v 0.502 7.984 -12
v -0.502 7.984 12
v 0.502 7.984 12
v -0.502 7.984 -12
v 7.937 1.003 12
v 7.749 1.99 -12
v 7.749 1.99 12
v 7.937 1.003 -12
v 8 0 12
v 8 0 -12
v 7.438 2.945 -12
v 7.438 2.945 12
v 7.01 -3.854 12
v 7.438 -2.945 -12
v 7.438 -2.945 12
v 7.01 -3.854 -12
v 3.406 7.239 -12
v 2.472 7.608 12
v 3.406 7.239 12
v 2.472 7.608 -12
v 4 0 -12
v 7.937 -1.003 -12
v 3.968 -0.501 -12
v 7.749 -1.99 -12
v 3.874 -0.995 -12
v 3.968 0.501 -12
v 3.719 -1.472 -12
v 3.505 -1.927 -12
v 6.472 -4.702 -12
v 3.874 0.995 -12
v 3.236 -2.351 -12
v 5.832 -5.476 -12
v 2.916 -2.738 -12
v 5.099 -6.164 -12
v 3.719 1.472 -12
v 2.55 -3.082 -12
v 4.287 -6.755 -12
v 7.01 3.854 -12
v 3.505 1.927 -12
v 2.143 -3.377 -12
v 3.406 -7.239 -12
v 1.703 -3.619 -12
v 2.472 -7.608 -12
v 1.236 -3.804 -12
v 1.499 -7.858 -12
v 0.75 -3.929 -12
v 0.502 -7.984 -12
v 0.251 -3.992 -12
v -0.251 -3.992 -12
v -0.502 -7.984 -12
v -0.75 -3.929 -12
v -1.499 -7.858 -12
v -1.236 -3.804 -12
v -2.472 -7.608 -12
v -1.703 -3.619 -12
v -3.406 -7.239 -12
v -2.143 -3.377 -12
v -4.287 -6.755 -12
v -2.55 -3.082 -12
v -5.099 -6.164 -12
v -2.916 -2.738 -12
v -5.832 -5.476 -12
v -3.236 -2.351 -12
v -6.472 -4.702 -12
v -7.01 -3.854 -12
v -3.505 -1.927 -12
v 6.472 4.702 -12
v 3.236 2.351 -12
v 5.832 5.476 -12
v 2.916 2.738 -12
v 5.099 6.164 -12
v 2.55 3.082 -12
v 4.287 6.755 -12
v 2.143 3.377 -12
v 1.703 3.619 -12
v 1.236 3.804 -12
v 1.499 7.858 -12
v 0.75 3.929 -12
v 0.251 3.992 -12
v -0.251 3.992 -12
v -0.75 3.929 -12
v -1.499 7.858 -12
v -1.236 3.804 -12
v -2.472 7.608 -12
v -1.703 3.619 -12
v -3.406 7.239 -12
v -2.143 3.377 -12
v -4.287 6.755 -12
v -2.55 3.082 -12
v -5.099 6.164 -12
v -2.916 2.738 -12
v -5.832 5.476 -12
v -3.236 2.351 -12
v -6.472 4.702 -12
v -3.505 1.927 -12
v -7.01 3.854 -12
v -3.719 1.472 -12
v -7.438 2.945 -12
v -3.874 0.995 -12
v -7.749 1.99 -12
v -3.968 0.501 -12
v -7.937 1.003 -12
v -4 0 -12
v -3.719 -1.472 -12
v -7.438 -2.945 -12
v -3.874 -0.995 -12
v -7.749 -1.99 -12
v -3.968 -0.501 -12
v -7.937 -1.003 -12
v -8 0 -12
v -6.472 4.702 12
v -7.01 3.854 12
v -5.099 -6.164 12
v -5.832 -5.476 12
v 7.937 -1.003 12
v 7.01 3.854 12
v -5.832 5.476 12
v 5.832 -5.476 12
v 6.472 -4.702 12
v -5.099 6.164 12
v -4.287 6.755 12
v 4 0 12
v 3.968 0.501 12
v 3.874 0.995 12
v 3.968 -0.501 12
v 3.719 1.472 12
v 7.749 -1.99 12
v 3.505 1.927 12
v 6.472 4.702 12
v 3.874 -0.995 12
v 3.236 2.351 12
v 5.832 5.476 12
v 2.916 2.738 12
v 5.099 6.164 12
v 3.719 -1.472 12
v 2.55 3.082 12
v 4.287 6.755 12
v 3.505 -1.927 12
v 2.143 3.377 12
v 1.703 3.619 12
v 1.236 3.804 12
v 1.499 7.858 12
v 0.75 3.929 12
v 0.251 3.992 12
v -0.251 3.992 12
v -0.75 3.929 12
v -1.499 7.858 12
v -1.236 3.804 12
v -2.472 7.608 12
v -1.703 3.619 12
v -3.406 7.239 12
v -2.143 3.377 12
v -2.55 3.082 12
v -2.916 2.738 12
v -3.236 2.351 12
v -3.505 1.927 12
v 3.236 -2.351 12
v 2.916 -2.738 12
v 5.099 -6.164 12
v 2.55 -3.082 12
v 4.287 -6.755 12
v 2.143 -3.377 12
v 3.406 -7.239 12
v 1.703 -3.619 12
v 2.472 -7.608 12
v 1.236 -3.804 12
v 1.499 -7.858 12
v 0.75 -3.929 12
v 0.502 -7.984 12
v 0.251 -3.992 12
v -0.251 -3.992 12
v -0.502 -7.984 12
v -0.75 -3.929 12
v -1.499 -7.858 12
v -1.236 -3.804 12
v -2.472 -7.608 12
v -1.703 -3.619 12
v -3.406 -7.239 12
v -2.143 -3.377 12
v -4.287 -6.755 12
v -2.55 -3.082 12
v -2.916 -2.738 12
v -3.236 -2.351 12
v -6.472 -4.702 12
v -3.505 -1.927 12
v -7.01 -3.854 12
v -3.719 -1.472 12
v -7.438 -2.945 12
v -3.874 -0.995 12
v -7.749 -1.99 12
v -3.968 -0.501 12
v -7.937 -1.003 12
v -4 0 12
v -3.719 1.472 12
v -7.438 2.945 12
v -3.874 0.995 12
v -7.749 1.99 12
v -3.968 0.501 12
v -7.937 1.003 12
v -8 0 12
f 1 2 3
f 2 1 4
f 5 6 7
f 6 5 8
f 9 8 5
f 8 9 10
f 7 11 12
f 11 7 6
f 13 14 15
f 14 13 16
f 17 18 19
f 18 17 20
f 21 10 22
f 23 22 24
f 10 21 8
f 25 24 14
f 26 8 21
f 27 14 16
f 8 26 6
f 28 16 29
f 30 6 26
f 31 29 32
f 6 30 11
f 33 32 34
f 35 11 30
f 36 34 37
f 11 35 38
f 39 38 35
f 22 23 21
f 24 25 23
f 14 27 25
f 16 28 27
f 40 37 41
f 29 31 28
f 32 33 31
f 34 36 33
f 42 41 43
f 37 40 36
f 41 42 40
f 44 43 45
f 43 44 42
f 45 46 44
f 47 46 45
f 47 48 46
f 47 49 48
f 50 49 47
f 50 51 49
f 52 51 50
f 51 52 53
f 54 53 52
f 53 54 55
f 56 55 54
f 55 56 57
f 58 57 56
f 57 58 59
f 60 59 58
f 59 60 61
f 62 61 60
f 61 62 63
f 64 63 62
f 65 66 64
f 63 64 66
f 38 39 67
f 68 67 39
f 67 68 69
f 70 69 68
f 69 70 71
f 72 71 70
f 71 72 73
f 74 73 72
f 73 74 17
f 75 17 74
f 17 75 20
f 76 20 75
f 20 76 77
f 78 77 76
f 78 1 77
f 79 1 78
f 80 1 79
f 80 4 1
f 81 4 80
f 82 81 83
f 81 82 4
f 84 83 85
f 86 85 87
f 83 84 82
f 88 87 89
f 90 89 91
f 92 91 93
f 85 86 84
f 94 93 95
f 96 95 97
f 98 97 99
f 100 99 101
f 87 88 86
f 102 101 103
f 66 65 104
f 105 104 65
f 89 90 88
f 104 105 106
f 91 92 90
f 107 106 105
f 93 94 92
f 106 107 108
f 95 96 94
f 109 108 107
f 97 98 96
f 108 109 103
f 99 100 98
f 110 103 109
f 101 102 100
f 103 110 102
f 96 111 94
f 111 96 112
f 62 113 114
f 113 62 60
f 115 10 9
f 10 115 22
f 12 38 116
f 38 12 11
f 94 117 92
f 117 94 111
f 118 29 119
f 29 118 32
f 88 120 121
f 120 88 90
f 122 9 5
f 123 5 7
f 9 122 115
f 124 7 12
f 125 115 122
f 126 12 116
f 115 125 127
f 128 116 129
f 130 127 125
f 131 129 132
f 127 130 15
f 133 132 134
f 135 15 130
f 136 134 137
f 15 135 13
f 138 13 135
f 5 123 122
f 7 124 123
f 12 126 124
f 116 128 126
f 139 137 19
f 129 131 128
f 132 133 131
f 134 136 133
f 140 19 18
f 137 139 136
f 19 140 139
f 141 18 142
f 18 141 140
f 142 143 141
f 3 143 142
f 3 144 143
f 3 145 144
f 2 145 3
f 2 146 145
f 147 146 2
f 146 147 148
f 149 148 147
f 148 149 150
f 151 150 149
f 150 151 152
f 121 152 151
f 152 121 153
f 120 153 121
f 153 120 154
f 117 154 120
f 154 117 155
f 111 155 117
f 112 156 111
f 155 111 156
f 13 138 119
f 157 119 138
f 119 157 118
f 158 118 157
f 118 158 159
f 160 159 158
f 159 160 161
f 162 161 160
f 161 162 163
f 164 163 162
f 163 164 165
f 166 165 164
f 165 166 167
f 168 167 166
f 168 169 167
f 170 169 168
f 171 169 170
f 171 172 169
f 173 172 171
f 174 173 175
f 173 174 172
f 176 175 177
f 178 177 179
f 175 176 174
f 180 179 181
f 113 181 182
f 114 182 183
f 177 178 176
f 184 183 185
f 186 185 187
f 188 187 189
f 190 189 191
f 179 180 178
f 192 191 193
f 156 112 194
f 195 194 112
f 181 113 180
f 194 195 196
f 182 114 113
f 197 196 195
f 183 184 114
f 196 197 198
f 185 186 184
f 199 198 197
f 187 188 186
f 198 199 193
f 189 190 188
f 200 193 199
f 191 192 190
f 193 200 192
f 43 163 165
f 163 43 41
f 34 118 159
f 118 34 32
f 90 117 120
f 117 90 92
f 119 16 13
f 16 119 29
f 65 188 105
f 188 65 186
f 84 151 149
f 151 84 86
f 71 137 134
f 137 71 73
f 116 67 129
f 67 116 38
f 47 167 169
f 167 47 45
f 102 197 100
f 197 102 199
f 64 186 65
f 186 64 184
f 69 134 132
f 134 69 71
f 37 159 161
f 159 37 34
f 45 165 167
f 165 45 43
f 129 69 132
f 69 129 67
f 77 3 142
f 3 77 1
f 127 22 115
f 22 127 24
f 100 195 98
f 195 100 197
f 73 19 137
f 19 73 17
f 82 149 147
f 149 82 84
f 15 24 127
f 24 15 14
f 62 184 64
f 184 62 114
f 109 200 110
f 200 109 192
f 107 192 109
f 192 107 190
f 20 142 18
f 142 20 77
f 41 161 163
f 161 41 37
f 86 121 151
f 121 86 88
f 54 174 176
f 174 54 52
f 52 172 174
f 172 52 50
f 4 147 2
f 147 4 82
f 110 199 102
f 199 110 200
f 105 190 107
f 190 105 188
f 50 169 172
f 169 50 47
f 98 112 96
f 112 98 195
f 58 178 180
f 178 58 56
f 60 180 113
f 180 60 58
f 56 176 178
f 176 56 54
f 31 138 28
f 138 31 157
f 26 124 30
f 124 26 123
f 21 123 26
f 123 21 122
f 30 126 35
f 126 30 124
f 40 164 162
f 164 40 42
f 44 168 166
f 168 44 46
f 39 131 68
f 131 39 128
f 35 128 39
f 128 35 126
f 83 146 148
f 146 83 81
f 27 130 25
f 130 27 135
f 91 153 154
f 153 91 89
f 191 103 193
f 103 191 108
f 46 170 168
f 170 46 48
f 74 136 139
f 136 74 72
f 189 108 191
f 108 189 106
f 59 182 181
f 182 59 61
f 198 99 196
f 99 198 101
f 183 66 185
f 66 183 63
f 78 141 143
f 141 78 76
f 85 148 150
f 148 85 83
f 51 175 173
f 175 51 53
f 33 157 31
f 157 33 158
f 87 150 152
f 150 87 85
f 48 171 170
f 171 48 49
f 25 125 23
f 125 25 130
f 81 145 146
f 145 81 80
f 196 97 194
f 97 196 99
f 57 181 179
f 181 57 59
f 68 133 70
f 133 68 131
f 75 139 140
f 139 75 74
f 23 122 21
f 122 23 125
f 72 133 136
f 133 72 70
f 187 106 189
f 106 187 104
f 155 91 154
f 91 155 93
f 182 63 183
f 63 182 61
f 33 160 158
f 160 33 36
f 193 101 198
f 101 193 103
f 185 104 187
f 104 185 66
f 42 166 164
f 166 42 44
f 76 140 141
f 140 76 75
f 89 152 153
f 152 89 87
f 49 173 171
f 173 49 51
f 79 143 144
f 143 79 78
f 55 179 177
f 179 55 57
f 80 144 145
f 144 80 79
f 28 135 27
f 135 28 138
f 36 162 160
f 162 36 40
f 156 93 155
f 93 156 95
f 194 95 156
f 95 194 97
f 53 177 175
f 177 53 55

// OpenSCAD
$fn = 50;


difference() {
	union() {
		translate(v = [0, 0, -12.0000000000]) {
			cylinder(h = 24, r = 8.0000000000);
		}
	}
	union() {
		translate(v = [0, 0, -100.0000000000]) {
			cylinder(h = 200, r = 4.0000000000);
		}
	}
}
